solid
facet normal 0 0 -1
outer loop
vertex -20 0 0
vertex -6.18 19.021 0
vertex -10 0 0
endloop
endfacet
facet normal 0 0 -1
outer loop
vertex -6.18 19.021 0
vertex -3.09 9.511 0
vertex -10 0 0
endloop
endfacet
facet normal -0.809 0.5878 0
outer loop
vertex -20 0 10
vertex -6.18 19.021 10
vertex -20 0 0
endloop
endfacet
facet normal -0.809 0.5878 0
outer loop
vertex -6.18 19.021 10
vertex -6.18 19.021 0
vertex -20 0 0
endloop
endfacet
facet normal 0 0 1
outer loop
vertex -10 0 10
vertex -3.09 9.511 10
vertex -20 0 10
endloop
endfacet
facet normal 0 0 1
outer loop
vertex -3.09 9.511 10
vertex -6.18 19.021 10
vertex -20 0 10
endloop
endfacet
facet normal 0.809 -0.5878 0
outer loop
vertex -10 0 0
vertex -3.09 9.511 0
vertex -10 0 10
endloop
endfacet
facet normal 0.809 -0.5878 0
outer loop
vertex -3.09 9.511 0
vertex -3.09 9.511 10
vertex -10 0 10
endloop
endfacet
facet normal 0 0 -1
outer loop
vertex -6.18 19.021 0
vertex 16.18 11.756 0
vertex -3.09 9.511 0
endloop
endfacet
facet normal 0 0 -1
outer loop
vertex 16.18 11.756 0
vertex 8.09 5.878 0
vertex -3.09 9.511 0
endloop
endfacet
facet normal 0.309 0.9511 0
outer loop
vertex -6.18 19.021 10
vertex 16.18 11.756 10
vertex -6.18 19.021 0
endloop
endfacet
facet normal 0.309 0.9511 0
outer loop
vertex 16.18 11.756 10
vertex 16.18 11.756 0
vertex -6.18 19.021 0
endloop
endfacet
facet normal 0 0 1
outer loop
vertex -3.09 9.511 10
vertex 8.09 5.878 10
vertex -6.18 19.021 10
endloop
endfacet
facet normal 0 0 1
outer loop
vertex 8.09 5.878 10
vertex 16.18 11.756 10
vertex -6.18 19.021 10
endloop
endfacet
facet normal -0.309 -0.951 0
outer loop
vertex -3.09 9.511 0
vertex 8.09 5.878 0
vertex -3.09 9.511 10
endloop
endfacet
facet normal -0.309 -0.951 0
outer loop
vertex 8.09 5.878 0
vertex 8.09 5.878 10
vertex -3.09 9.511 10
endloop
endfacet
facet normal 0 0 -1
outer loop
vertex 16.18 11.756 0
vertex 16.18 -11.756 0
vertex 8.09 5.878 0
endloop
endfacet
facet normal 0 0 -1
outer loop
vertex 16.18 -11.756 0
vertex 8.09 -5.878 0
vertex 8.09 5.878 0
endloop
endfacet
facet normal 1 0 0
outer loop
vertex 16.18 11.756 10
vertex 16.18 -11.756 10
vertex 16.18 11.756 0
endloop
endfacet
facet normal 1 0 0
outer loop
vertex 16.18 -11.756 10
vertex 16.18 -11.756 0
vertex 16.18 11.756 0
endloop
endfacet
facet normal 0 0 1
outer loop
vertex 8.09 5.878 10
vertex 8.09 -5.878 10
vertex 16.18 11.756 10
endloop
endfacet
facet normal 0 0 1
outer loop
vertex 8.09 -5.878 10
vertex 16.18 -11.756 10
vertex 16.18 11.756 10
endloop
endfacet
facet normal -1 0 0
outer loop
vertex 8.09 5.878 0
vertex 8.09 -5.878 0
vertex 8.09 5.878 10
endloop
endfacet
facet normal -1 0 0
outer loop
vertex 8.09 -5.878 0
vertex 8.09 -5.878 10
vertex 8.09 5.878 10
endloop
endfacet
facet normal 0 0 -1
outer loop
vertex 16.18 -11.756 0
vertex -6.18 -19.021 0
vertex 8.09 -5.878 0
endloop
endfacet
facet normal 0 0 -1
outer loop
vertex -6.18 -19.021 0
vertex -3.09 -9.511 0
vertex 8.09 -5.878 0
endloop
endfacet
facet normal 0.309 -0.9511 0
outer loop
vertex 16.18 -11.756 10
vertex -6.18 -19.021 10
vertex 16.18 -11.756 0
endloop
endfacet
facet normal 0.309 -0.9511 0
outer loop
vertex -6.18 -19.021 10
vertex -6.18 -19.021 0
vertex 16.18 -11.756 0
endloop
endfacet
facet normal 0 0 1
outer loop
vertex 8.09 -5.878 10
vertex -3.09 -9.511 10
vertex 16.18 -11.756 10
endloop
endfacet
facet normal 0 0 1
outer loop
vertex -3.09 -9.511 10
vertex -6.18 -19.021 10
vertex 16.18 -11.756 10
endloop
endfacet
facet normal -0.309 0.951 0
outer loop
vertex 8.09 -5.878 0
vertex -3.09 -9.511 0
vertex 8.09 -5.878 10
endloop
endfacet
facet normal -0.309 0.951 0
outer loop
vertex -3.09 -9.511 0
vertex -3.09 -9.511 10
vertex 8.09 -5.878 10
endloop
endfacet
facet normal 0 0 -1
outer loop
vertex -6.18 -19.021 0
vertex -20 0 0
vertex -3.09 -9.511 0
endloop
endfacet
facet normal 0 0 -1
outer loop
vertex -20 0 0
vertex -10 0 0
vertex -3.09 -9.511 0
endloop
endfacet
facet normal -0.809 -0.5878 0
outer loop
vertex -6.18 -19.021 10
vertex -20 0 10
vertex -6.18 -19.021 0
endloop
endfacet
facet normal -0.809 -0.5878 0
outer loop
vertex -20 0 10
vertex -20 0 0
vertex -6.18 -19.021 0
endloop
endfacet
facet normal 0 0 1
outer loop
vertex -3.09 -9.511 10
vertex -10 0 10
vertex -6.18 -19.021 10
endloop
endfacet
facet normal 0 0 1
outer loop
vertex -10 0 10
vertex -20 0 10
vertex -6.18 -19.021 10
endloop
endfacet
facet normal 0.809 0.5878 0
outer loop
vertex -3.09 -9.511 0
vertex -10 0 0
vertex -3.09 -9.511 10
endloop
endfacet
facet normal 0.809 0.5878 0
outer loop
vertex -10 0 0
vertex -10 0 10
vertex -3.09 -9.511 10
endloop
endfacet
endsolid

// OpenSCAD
//list "comprehension"

module regularPolygon(n, r) {
    da = 360/n;
    a=[for (t=[0:da:360]) [ r*cos(t), r*sin(t)  ] ] ;
    polygon(a);
}

/*
difference() {
    linear_extrude(height=1)
        regularPolygon(7, 30);
//    cube(4, center=true);
    translate([-10,-5, .2])
    linear_extrude(height=1)
        text("DK", font="Times");
}
*/

//square(10);
//circle(5);
//square([10,20]);
/*
linear_extrude(height=30, twist=360, scale=0)
    square(10, center=true);

*/

rotate_extrude($fn=5) {
    translate([10,0])
        square(10);
}
